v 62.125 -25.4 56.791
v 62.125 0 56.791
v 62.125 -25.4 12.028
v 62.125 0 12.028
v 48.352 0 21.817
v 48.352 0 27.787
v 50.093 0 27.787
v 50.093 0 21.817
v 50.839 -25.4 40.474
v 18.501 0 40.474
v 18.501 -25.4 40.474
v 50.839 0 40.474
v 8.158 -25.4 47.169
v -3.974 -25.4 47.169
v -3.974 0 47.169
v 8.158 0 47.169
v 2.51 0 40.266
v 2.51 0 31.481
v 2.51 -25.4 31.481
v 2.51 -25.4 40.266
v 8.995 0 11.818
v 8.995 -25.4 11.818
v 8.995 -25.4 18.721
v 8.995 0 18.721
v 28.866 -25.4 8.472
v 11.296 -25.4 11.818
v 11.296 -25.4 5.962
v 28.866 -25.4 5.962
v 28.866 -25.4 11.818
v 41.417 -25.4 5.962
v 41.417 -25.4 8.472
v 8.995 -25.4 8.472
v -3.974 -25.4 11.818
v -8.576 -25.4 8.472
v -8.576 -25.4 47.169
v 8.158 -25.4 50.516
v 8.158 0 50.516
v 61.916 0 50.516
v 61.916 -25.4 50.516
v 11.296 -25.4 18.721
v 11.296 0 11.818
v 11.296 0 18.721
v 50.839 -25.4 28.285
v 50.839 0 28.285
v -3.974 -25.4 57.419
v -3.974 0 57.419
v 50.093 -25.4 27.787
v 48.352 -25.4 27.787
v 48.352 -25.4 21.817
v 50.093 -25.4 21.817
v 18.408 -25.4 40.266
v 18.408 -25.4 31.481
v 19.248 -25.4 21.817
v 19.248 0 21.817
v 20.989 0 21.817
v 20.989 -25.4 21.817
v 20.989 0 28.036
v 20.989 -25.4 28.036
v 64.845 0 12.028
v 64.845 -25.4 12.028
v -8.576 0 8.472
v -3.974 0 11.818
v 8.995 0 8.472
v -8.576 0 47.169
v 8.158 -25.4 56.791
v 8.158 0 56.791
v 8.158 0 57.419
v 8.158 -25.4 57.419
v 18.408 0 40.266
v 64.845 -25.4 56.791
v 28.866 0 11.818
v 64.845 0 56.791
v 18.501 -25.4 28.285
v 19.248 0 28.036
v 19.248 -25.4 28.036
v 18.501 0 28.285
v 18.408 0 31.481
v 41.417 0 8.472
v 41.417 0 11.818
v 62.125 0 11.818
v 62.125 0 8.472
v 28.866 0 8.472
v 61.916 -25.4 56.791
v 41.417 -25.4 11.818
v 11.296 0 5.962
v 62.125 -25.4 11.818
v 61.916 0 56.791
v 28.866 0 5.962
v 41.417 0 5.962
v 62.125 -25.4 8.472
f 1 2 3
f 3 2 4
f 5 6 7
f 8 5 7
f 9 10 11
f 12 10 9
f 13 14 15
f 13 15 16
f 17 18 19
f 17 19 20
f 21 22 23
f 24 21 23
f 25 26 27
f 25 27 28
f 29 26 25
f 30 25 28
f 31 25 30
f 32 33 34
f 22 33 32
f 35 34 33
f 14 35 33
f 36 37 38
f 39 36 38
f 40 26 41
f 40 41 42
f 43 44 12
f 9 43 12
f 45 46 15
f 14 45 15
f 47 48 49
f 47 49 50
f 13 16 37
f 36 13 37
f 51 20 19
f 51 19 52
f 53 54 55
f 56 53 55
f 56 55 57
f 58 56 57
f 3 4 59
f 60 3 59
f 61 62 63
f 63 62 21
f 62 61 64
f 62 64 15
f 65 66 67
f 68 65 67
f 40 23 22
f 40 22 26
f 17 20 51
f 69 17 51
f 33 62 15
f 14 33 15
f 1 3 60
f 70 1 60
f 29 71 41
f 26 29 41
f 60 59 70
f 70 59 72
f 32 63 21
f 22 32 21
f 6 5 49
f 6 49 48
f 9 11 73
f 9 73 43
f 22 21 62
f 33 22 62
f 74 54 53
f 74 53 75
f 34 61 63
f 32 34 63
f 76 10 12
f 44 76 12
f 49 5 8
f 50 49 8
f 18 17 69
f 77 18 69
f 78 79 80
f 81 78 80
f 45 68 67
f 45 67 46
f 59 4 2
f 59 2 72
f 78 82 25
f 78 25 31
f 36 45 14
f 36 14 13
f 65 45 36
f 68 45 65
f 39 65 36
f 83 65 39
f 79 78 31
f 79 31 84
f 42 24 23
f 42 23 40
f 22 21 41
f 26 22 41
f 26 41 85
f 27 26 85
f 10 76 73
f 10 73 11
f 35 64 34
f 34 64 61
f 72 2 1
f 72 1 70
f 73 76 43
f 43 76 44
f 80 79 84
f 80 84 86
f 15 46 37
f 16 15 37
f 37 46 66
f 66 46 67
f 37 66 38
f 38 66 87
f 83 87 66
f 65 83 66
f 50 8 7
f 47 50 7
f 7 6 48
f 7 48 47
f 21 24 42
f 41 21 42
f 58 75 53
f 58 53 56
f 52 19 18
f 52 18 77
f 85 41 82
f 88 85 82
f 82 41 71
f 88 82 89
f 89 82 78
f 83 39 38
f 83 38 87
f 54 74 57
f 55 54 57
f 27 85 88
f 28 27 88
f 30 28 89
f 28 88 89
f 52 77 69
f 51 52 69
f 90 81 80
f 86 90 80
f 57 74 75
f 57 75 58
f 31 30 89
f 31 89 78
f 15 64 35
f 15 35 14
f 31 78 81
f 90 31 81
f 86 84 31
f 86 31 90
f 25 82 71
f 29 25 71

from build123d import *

# Parameters (mm, degrees)
F0_W     = 32.3380418122
F0_H     = 12.1889561415
F2_DEPTH = 25.4
F1_W     = 1.741277054
F1_H     = 6.2188543379
F3_DEPTH = 25.4
F1_W_2   = 1.7412863672
F1_H_2   = 5.9700999409
F4_W     = 15.8974092919
F4_H     = 8.7854117155
F5_DEPTH = 25.4
F4_W_2   = 20.7084715366
F4_H_2   = 3.3468240872
F4_W_3   = 12.5505886972
F4_H_3   = 2.5101173669
F4_W_4   = 33.2590593025
F4_H_4   = 6.275292486
F4_W_5   = 1.2550577521
F4_W_6   = 19.2442387342
F4_W_7   = 4.601882305
F4_H_5   = 35.3508265689
F4_W_8   = 2.3009395227
F4_H_6   = 6.9028222933
F4_W_9   = 2.7192905545
F4_H_7   = 17.1524714679
F4_H_8   = 27.6112947613


# Not quite as in the source:
# - a feature names something its author has since deleted; it is built from what else it names


with BuildPart() as f2:
    # F0 (on Front) → F2 (new body)
    with BuildSketch(Plane.XZ):
        with Locations((34.6703026444, 34.3791767955)):
            Rectangle(F0_W, F0_H)
    extrude(amount=F2_DEPTH)


with BuildPart() as f3:
    # F1 (on Front) → F3 (new body)
    with BuildSketch(Plane.XZ):
        with Locations((20.1181834564, 24.9265171587)):
            Rectangle(F1_W, F1_H)
    extrude(amount=F3_DEPTH)


with BuildPart() as f3b:
    # F1 (on Front) → F3, piece 2 (new body)
    with BuildSketch(Plane.XZ):
        with Locations((49.2224190384, 24.8021399602)):
            Rectangle(F1_W_2, F1_H_2)
    extrude(amount=F3_DEPTH)


with BuildPart() as f5:
    # F4 (on Front) → F5 (new body)
    with BuildSketch(Plane.XZ):
        with Locations((10.4588227114, 35.8737669885)):
            Rectangle(F4_W, F4_H)
    extrude(amount=F5_DEPTH)


with BuildPart() as f5b:
    # F4 (on Front) → F5, piece 2 (new body)
    with BuildSketch(Plane.XZ):
        with Locations((51.7711788416, 10.1450593211)):
            Rectangle(F4_W_2, F4_H_2)
    extrude(amount=F5_DEPTH)


with BuildPart() as f5c:
    # F4 (on Front) → F5, piece 3 (new body)
    with BuildSketch(Plane.XZ):
        Polygon((28.8663543761, 11.8184713647), (11.2955290824, 11.8184713647), (11.2955290824, 5.9615299106), (28.8663543761, 5.9615299106), (28.8663543761, 8.4716472775), align=None)
        with Locations((35.1416487247, 7.216588594)):
            Rectangle(F4_W_3, F4_H_3)
    extrude(amount=F5_DEPTH)


with BuildPart() as f5d:
    # F4 (on Front) → F5, piece 4 (new body)
    with BuildSketch(Plane.XZ):
        Polygon((-3.9743534289, 57.4189424515), (-3.9743534289, 47.1692979336), (8.1578837708, 47.1692979336), (8.1578837708, 50.5161210895), (8.1578837708, 56.7914135754), (8.1578837708, 57.4189424515), align=None)
        with Locations((24.787413422, 53.6537673324)):
            Rectangle(F4_W_4, F4_H_4)
        with Locations((42.0444719493, 53.6537673324)):
            Rectangle(F4_W_5, F4_H_4)
        with Locations((52.2941201925, 53.6537673324)):
            Rectangle(F4_W_6, F4_H_4)
    extrude(amount=F5_DEPTH)


with BuildPart() as f5e:
    # F4 (on Front) → F5, piece 5 (new body)
    with BuildSketch(Plane.XZ):
        Polygon((8.9945895597, 8.4716472775), (8.9945895597, 11.8184713647), (-3.9743534289, 11.8184713647), (-8.5762357339, 11.8184713647), (-8.5762357339, 8.4716472775), align=None)
        with Locations((-6.2752945814, 29.4938846491)):
            Rectangle(F4_W_7, F4_H_5)
    extrude(amount=F5_DEPTH)


with BuildPart() as f5f:
    # F4 (on Front) → F5, piece 6 (new body)
    with BuildSketch(Plane.XZ):
        with Locations((10.1450593211, 15.2698825113)):
            Rectangle(F4_W_8, F4_H_6)
    extrude(amount=F5_DEPTH)


with BuildPart() as f5g:
    # F4 (on Front) → F5, piece 7 (new body)
    with BuildSketch(Plane.XZ):
        with Locations((63.4850598872, 20.6038830802)):
            Rectangle(F4_W_9, F4_H_7)
        with Locations((63.4850598872, 42.9857661948)):
            Rectangle(F4_W_9, F4_H_8)
    extrude(amount=F5_DEPTH)


solid = Compound([f2.part, f3.part, f3b.part, f5.part, f5b.part, f5c.part, f5d.part, f5e.part, f5f.part, f5g.part])
